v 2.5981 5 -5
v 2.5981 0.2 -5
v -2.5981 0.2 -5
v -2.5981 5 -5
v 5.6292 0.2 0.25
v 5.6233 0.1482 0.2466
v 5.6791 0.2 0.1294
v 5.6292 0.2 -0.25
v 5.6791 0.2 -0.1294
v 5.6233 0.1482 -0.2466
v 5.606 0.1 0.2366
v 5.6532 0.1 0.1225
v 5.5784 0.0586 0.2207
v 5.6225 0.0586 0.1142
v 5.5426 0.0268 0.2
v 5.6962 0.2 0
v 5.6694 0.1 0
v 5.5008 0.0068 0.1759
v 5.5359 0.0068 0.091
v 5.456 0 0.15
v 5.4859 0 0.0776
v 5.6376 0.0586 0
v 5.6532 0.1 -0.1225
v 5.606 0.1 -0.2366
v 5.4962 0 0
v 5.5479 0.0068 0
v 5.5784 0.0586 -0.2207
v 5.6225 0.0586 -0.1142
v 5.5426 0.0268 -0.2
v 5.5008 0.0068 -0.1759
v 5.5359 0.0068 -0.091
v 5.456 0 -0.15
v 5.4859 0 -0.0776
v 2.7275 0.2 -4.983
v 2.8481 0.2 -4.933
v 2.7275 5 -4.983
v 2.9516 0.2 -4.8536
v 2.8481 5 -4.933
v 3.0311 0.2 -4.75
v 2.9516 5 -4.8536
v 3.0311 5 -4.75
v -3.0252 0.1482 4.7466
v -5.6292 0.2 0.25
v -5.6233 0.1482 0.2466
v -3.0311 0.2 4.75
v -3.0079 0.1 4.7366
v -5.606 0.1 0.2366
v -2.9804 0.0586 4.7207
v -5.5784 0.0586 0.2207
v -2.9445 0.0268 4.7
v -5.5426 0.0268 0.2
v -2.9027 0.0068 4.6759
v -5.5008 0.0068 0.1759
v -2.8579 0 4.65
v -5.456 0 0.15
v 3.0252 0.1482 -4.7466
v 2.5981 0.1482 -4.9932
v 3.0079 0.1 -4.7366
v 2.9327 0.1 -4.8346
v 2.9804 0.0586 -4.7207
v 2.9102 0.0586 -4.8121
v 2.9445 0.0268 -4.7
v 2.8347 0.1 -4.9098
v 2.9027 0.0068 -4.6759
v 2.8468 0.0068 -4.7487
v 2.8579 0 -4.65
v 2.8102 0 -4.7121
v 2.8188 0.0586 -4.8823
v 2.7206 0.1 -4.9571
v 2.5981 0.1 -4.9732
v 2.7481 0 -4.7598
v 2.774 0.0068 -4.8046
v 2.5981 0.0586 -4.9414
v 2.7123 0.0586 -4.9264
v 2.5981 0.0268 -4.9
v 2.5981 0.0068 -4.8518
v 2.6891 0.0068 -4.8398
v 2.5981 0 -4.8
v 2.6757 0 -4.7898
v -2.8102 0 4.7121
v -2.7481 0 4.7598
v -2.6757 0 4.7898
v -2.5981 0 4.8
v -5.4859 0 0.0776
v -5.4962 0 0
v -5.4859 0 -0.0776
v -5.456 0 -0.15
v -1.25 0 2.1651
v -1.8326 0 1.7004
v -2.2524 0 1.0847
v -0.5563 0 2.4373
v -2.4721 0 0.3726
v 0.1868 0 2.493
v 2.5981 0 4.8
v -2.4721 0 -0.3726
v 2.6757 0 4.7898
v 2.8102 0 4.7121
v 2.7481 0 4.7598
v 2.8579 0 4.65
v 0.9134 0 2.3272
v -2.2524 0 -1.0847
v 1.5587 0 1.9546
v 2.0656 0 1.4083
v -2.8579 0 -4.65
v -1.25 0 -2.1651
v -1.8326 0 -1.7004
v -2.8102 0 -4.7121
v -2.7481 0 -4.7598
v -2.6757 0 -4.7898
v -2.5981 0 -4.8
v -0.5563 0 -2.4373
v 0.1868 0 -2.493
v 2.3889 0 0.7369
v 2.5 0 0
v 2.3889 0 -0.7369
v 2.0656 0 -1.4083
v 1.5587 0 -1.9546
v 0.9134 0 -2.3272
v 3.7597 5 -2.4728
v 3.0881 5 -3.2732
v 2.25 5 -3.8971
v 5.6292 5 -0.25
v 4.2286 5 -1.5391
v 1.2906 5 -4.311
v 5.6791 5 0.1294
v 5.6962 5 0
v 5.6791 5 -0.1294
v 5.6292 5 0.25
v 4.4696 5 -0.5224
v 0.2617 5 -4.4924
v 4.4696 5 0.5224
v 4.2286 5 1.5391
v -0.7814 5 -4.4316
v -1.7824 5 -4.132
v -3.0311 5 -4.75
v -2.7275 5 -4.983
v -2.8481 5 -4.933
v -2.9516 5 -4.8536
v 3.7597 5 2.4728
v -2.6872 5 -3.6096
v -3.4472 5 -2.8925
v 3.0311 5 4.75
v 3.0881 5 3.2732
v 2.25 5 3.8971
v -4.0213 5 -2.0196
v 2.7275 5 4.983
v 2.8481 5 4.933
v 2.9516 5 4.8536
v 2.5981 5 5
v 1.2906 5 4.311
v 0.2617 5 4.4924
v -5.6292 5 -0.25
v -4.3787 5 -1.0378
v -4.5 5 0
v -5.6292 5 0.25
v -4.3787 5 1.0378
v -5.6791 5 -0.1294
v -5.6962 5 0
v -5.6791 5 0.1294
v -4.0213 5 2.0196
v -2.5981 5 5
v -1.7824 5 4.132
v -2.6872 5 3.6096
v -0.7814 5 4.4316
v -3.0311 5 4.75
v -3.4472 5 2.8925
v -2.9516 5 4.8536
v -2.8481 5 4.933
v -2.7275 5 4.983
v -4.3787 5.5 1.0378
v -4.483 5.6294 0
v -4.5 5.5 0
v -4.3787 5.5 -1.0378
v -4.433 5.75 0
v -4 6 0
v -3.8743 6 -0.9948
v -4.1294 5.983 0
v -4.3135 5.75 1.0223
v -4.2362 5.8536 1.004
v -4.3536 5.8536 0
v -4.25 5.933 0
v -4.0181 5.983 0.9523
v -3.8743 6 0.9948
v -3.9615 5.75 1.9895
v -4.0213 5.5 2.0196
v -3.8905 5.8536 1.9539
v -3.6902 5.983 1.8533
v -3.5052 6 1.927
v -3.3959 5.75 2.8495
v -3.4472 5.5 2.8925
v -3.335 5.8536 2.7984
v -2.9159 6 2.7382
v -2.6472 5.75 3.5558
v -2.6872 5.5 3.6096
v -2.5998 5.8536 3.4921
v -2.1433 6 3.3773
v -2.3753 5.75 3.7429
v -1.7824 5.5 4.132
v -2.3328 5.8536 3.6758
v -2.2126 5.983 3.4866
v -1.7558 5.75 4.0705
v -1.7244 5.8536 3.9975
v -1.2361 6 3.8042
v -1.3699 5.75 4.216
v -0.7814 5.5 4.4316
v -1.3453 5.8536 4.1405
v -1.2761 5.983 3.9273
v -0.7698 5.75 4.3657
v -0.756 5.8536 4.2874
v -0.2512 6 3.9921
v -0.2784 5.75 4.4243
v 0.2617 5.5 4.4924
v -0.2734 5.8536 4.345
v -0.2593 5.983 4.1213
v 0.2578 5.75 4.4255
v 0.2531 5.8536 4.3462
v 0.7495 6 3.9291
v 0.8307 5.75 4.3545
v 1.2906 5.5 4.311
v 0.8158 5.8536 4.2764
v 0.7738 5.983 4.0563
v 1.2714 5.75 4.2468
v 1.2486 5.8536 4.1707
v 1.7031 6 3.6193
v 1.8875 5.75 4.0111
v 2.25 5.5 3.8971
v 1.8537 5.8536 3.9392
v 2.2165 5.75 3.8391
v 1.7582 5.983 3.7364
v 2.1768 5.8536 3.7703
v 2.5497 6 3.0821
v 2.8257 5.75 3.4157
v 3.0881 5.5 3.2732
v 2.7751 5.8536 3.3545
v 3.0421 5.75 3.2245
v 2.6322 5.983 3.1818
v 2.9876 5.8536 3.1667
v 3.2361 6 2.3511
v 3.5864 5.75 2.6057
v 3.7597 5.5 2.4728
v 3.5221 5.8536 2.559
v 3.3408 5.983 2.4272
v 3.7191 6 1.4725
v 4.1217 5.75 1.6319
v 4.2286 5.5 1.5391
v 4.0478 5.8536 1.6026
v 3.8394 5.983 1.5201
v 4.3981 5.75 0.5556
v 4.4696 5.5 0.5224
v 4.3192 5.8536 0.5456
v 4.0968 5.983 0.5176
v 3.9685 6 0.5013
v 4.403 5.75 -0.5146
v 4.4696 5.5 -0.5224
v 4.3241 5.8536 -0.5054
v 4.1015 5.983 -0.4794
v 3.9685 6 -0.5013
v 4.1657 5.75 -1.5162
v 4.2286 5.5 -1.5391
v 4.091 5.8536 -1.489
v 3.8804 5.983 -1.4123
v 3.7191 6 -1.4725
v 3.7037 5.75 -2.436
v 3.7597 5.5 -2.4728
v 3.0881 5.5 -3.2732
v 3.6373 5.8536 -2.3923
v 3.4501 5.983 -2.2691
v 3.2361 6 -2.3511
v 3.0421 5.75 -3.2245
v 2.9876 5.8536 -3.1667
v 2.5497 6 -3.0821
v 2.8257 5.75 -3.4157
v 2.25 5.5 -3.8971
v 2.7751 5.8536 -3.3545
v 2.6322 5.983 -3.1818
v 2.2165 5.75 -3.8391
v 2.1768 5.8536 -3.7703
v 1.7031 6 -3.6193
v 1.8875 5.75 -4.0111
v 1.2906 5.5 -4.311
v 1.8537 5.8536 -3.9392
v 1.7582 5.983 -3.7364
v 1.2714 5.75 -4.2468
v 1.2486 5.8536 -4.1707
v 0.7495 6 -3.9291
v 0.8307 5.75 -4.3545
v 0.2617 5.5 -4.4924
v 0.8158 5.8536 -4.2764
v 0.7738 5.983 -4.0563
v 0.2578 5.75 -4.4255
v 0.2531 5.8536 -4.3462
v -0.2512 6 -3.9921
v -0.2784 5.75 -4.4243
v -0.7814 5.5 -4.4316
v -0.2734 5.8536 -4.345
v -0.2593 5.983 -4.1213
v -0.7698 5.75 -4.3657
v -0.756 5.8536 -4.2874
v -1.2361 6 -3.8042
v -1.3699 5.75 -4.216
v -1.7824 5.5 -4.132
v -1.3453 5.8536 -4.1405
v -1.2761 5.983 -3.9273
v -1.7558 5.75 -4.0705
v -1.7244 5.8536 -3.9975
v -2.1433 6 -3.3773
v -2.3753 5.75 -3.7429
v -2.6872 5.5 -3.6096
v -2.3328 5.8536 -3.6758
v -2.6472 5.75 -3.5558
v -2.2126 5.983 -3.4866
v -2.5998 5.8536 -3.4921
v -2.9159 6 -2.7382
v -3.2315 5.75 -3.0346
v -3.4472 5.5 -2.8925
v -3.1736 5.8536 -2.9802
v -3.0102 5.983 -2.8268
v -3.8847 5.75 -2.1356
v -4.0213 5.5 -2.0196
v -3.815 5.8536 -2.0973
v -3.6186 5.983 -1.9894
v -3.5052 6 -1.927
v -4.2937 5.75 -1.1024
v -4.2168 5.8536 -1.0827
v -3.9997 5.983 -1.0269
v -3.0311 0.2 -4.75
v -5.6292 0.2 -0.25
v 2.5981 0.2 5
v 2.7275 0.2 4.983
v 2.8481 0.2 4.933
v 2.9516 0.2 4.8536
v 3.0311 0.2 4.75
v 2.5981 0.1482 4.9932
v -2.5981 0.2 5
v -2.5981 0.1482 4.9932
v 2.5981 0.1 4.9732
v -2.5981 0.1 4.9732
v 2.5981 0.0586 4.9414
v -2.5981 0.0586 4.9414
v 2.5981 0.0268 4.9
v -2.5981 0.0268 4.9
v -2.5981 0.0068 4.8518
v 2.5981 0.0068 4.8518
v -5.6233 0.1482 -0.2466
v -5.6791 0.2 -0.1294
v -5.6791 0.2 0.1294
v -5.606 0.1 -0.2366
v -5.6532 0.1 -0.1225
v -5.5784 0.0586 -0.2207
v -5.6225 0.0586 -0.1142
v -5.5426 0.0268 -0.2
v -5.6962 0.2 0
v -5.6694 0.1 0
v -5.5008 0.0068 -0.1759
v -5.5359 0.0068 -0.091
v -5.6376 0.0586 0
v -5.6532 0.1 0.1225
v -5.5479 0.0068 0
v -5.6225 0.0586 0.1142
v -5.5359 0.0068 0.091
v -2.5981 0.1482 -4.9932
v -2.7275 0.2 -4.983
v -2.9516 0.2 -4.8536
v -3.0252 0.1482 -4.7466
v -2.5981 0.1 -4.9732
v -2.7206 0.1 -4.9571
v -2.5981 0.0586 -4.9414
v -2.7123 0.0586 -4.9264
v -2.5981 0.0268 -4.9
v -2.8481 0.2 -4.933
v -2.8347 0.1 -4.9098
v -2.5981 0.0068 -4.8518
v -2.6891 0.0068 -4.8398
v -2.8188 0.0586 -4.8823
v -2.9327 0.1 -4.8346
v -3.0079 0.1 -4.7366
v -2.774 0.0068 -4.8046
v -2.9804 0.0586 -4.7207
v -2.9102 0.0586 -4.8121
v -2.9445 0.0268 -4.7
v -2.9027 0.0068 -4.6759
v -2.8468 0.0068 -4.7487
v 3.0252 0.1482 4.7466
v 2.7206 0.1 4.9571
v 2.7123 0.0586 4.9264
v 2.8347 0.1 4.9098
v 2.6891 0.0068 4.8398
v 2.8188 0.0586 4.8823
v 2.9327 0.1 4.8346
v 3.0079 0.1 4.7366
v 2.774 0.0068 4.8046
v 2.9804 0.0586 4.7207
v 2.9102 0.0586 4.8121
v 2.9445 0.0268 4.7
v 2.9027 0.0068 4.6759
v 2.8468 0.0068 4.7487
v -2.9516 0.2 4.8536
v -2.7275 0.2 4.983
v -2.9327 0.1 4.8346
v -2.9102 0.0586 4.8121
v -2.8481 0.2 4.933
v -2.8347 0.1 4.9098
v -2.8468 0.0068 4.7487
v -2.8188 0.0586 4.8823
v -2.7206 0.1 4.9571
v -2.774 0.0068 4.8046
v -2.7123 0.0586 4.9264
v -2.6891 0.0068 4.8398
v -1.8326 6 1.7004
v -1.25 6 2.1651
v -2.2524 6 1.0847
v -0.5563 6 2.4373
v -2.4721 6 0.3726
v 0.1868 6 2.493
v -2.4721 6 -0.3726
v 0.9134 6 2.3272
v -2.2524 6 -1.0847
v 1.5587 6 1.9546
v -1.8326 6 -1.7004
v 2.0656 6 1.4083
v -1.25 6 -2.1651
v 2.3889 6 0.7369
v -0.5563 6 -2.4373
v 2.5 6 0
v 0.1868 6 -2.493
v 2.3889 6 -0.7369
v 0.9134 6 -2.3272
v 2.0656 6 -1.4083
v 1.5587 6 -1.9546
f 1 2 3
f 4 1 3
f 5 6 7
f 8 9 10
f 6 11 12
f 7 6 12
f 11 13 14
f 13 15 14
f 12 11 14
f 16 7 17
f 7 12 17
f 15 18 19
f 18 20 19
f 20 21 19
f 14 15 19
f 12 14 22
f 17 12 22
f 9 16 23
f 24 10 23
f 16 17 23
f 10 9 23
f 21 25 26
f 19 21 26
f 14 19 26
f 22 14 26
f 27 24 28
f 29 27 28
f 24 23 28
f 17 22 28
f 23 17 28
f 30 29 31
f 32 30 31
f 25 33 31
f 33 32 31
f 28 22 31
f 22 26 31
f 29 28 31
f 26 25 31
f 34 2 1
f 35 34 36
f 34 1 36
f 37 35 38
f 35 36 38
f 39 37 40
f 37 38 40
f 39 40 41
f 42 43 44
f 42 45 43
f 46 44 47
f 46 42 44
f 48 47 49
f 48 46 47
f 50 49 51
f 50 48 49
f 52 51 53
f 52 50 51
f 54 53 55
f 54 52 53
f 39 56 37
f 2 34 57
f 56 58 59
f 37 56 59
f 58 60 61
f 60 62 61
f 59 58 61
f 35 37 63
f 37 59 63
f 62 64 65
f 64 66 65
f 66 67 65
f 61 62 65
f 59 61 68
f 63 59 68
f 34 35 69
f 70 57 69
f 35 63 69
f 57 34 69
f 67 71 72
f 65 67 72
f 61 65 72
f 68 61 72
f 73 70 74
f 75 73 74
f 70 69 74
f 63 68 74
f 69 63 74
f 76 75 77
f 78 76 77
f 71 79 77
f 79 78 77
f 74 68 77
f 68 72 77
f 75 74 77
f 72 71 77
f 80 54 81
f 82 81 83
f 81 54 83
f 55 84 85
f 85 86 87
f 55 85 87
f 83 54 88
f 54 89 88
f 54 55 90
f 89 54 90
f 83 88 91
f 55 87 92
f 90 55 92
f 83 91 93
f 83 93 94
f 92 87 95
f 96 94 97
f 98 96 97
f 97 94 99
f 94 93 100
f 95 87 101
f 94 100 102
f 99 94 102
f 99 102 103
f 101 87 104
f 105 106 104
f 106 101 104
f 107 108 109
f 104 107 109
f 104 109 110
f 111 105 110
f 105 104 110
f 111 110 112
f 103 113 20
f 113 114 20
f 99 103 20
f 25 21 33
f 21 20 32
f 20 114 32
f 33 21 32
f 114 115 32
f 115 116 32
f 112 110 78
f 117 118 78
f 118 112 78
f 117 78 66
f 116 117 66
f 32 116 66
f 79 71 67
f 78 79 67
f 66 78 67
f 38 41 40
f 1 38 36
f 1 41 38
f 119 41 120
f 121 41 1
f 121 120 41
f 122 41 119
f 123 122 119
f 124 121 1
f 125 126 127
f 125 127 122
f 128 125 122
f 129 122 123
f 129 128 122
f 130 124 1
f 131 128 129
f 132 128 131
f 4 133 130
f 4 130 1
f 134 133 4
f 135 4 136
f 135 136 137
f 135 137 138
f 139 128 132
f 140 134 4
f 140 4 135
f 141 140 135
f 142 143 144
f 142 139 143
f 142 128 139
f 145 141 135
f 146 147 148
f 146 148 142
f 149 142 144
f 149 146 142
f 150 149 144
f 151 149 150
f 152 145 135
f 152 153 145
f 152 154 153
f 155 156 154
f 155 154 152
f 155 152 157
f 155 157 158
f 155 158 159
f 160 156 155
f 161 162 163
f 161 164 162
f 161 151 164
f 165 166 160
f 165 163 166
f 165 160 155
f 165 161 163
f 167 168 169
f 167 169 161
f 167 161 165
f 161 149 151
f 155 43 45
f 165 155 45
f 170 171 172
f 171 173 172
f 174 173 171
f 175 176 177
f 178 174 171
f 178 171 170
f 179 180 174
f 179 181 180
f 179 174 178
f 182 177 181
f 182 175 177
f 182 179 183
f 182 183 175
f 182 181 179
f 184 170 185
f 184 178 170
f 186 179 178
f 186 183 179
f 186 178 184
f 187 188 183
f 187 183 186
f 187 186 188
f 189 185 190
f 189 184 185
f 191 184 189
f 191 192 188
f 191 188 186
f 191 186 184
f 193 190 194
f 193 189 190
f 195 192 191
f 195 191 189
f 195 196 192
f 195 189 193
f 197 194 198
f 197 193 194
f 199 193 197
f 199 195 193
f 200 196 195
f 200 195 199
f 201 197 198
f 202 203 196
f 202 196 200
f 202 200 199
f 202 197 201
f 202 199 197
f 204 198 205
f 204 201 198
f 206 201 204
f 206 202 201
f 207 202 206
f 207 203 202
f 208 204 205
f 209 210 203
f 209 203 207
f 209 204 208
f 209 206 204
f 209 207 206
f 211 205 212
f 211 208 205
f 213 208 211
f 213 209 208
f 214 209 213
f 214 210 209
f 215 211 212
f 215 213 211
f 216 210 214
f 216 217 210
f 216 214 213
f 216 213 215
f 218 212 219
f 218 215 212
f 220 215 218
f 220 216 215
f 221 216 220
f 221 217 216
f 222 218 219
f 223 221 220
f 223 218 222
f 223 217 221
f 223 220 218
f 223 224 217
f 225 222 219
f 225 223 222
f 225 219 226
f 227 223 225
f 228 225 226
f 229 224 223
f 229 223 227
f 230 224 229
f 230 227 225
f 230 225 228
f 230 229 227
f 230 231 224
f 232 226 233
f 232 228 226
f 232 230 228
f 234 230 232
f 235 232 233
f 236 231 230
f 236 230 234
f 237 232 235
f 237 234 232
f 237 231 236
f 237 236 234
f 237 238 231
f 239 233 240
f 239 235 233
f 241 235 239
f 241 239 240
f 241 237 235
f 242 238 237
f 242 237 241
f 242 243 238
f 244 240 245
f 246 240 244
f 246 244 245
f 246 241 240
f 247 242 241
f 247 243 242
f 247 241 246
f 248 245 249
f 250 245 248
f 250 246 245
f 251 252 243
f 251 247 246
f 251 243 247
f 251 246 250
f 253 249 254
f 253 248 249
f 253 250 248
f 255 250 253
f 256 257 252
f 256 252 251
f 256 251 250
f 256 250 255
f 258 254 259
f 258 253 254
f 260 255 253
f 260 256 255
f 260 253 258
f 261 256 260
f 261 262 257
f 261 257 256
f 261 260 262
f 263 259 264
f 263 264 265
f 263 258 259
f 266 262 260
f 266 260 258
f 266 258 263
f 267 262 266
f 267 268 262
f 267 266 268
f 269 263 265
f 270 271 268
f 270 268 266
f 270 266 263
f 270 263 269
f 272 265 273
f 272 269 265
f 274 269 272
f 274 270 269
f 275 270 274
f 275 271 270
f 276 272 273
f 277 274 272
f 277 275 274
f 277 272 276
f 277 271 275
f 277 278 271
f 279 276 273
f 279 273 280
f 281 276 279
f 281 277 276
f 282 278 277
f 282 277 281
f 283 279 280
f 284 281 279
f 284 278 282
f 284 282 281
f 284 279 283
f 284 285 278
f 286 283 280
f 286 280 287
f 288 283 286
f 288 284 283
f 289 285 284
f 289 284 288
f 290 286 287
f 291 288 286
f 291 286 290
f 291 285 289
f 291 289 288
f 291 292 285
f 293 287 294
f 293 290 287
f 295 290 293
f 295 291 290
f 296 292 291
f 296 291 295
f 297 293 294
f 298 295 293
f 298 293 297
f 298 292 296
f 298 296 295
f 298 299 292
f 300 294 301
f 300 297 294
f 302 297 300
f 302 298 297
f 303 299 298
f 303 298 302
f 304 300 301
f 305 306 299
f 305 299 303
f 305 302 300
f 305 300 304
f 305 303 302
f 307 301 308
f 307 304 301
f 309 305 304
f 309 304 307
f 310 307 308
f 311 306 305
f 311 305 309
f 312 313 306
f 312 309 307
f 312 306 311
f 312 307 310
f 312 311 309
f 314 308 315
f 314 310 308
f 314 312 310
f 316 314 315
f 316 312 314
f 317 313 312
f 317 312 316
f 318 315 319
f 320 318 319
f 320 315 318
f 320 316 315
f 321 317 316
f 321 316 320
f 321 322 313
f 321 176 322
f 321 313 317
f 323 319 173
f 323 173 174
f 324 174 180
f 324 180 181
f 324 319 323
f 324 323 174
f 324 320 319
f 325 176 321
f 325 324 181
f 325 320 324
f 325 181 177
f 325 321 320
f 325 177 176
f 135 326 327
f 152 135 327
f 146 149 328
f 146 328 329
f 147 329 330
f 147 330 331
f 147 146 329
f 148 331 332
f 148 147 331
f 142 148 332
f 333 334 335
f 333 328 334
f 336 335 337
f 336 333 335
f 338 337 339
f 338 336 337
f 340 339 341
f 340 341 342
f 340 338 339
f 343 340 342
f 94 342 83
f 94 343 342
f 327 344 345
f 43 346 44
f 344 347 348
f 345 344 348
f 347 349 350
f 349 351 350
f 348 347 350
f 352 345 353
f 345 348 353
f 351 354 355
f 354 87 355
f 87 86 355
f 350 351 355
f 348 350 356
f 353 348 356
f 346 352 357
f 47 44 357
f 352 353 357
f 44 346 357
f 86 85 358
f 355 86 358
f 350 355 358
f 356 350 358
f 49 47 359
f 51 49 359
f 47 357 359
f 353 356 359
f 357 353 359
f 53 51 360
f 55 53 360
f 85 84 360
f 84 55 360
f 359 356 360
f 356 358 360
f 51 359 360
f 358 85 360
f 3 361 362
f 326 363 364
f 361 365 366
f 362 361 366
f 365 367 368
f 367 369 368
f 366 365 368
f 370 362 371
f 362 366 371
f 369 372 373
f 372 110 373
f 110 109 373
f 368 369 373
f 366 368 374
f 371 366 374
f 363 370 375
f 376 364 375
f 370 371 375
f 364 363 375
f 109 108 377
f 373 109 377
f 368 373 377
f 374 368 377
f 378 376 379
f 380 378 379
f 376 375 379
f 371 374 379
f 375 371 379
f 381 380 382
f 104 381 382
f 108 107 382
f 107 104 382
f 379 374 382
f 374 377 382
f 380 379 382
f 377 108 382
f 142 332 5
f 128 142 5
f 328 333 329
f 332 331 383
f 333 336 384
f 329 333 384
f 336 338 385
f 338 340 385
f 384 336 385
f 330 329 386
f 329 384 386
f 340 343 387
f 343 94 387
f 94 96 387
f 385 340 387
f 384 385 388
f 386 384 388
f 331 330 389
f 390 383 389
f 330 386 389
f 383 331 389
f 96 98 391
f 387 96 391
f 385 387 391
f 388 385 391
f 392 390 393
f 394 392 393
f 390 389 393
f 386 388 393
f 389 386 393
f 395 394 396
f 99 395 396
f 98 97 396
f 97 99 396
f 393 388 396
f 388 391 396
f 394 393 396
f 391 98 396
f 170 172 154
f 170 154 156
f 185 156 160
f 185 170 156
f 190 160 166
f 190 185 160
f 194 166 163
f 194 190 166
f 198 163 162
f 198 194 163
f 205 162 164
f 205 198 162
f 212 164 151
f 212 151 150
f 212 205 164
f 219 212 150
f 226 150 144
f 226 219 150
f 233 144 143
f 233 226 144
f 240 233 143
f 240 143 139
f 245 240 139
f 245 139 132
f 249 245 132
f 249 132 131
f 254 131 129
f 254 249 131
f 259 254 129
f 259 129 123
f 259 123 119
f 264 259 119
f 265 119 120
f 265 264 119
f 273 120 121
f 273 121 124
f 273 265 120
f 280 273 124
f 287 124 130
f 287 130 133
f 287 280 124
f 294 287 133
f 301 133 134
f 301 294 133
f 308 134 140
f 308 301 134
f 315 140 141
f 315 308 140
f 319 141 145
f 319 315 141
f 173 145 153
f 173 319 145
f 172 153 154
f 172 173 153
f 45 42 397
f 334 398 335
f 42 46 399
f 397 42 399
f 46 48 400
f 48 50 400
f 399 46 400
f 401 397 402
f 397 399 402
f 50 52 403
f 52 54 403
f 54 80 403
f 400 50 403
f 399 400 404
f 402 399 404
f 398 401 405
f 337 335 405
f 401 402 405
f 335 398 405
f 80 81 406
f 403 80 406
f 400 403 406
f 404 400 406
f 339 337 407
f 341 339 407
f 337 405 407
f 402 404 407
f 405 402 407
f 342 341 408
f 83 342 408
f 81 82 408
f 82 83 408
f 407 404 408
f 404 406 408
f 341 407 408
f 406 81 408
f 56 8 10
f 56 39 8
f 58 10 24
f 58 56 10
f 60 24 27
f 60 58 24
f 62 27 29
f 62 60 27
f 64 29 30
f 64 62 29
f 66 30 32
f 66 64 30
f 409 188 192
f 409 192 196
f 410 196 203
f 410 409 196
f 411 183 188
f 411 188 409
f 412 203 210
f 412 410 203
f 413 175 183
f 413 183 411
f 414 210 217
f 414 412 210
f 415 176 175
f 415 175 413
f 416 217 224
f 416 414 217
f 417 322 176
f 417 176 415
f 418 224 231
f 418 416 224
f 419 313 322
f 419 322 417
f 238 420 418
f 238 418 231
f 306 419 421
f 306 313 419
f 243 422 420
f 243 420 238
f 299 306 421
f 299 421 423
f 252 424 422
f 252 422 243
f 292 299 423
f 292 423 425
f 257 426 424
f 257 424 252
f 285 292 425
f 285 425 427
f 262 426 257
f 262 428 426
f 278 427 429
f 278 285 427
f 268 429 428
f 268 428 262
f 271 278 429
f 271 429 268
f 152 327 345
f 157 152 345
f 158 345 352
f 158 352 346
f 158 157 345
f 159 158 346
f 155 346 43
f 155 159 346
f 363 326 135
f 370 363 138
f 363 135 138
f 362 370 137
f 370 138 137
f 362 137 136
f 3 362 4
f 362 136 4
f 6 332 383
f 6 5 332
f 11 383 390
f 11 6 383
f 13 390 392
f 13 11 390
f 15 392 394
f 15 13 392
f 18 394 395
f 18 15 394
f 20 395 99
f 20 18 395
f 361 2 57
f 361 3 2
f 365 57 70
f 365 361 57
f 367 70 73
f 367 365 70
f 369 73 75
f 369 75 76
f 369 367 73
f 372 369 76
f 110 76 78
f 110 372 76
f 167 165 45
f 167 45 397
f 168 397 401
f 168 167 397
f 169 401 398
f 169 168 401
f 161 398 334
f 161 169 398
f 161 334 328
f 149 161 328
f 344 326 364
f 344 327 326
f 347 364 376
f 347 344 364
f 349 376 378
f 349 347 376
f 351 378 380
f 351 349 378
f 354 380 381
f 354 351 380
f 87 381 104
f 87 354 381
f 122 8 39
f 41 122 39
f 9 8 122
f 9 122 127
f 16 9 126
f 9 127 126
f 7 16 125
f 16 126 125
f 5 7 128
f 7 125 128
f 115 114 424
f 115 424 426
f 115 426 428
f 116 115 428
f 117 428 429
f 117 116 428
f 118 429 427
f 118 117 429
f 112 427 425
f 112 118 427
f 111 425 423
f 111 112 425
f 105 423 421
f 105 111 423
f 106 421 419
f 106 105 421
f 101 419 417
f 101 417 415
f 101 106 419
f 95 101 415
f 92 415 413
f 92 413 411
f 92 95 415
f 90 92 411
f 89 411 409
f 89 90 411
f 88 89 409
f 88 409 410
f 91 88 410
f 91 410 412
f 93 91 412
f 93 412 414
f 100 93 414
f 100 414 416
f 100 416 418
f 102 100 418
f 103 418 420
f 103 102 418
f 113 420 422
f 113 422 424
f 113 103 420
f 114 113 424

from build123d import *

# Parameters (mm, degrees)
CROQUIS1_R              = 2.5
SALIENTE_EXTRUIR1_DEPTH = 6
REDONDEO1_R             = 0.5
REDONDEO2_R             = 0.2
CROQUIS3_W              = 2.5
CROQUIS3_H              = 1
REDONDEO3_R             = 0.5


with BuildPart() as part:
    # Croquis1 → Saliente-Extruir1 (new body)
    with BuildSketch(Plane(origin=(0, 0, 0), x_dir=(1, 0, 0), z_dir=(0, 1, 0))):
        Polygon((-2.886751346, 5), (-5.773502692, 0), (-2.886751346, -5), (2.886751346, -5), (5.773502692, 0), (2.886751346, 5), align=None)
        Circle(CROQUIS1_R, mode=Mode.SUBTRACT)
    extrude(amount=SALIENTE_EXTRUIR1_DEPTH)

    # Redondeo1
    redondeo1_edges = [part.edges().sort_by_distance(p)[0] for p in [
        (2.886751346, 3, -5),
        (5.773502692, 3, 0),
        (2.886751346, 3, 5),
        (-2.886751346, 3, 5),
        (-5.773502692, 3, 0),
        (-2.886751346, 3, -5),
    ]]
    fillet(redondeo1_edges, radius=REDONDEO1_R)

    # Redondeo2
    redondeo2_edges = [part.edges().sort_by_distance(p)[0] for p in [
        (-4.330127019, 0, -2.5),
        (-4.330127019, 6, -2.5),
        (0, 0, -5),
        (4.330127019, 0, -2.5),
        (4.330127019, 0, 2.5),
        (0, 0, 5),
        (-4.330127019, 0, 2.5),
        (-2.848076211, 0, 4.933012702),
        (-5.696152423, 0, 0),
        (2.848076211, 0, 4.933012702),
        (5.696152423, 0, 0),
        (2.848076211, 0, -4.933012702),
        (-2.848076211, 0, -4.933012702),
        (0, 6, -5),
        (-4.330127019, 6, 2.5),
        (0, 6, 5),
        (4.330127019, 6, 2.5),
        (4.330127019, 6, -2.5),
        (-2.848076211, 6, 4.933012702),
        (-5.696152423, 6, 0),
        (2.848076211, 6, 4.933012702),
        (5.696152423, 6, 0),
        (2.848076211, 6, -4.933012702),
        (-2.848076211, 6, -4.933012702),
    ]]
    fillet(redondeo2_edges, radius=REDONDEO2_R)

    # Croquis3 → Cortar-Revolución1 (revolve, cut)
    with BuildSketch(Plane.XY):
        with Locations((-5.75, 5.5)):
            Rectangle(CROQUIS3_W, CROQUIS3_H)
    revolve(axis=Axis((0, 0, 0), (0, 1, 0)), mode=Mode.SUBTRACT)

    # Redondeo3
    redondeo3_edges = [part.edges().sort_by_distance(p)[0] for p in [
        (4.5, 6, 0),
    ]]
    fillet(redondeo3_edges, radius=REDONDEO3_R)


solid = part.part
